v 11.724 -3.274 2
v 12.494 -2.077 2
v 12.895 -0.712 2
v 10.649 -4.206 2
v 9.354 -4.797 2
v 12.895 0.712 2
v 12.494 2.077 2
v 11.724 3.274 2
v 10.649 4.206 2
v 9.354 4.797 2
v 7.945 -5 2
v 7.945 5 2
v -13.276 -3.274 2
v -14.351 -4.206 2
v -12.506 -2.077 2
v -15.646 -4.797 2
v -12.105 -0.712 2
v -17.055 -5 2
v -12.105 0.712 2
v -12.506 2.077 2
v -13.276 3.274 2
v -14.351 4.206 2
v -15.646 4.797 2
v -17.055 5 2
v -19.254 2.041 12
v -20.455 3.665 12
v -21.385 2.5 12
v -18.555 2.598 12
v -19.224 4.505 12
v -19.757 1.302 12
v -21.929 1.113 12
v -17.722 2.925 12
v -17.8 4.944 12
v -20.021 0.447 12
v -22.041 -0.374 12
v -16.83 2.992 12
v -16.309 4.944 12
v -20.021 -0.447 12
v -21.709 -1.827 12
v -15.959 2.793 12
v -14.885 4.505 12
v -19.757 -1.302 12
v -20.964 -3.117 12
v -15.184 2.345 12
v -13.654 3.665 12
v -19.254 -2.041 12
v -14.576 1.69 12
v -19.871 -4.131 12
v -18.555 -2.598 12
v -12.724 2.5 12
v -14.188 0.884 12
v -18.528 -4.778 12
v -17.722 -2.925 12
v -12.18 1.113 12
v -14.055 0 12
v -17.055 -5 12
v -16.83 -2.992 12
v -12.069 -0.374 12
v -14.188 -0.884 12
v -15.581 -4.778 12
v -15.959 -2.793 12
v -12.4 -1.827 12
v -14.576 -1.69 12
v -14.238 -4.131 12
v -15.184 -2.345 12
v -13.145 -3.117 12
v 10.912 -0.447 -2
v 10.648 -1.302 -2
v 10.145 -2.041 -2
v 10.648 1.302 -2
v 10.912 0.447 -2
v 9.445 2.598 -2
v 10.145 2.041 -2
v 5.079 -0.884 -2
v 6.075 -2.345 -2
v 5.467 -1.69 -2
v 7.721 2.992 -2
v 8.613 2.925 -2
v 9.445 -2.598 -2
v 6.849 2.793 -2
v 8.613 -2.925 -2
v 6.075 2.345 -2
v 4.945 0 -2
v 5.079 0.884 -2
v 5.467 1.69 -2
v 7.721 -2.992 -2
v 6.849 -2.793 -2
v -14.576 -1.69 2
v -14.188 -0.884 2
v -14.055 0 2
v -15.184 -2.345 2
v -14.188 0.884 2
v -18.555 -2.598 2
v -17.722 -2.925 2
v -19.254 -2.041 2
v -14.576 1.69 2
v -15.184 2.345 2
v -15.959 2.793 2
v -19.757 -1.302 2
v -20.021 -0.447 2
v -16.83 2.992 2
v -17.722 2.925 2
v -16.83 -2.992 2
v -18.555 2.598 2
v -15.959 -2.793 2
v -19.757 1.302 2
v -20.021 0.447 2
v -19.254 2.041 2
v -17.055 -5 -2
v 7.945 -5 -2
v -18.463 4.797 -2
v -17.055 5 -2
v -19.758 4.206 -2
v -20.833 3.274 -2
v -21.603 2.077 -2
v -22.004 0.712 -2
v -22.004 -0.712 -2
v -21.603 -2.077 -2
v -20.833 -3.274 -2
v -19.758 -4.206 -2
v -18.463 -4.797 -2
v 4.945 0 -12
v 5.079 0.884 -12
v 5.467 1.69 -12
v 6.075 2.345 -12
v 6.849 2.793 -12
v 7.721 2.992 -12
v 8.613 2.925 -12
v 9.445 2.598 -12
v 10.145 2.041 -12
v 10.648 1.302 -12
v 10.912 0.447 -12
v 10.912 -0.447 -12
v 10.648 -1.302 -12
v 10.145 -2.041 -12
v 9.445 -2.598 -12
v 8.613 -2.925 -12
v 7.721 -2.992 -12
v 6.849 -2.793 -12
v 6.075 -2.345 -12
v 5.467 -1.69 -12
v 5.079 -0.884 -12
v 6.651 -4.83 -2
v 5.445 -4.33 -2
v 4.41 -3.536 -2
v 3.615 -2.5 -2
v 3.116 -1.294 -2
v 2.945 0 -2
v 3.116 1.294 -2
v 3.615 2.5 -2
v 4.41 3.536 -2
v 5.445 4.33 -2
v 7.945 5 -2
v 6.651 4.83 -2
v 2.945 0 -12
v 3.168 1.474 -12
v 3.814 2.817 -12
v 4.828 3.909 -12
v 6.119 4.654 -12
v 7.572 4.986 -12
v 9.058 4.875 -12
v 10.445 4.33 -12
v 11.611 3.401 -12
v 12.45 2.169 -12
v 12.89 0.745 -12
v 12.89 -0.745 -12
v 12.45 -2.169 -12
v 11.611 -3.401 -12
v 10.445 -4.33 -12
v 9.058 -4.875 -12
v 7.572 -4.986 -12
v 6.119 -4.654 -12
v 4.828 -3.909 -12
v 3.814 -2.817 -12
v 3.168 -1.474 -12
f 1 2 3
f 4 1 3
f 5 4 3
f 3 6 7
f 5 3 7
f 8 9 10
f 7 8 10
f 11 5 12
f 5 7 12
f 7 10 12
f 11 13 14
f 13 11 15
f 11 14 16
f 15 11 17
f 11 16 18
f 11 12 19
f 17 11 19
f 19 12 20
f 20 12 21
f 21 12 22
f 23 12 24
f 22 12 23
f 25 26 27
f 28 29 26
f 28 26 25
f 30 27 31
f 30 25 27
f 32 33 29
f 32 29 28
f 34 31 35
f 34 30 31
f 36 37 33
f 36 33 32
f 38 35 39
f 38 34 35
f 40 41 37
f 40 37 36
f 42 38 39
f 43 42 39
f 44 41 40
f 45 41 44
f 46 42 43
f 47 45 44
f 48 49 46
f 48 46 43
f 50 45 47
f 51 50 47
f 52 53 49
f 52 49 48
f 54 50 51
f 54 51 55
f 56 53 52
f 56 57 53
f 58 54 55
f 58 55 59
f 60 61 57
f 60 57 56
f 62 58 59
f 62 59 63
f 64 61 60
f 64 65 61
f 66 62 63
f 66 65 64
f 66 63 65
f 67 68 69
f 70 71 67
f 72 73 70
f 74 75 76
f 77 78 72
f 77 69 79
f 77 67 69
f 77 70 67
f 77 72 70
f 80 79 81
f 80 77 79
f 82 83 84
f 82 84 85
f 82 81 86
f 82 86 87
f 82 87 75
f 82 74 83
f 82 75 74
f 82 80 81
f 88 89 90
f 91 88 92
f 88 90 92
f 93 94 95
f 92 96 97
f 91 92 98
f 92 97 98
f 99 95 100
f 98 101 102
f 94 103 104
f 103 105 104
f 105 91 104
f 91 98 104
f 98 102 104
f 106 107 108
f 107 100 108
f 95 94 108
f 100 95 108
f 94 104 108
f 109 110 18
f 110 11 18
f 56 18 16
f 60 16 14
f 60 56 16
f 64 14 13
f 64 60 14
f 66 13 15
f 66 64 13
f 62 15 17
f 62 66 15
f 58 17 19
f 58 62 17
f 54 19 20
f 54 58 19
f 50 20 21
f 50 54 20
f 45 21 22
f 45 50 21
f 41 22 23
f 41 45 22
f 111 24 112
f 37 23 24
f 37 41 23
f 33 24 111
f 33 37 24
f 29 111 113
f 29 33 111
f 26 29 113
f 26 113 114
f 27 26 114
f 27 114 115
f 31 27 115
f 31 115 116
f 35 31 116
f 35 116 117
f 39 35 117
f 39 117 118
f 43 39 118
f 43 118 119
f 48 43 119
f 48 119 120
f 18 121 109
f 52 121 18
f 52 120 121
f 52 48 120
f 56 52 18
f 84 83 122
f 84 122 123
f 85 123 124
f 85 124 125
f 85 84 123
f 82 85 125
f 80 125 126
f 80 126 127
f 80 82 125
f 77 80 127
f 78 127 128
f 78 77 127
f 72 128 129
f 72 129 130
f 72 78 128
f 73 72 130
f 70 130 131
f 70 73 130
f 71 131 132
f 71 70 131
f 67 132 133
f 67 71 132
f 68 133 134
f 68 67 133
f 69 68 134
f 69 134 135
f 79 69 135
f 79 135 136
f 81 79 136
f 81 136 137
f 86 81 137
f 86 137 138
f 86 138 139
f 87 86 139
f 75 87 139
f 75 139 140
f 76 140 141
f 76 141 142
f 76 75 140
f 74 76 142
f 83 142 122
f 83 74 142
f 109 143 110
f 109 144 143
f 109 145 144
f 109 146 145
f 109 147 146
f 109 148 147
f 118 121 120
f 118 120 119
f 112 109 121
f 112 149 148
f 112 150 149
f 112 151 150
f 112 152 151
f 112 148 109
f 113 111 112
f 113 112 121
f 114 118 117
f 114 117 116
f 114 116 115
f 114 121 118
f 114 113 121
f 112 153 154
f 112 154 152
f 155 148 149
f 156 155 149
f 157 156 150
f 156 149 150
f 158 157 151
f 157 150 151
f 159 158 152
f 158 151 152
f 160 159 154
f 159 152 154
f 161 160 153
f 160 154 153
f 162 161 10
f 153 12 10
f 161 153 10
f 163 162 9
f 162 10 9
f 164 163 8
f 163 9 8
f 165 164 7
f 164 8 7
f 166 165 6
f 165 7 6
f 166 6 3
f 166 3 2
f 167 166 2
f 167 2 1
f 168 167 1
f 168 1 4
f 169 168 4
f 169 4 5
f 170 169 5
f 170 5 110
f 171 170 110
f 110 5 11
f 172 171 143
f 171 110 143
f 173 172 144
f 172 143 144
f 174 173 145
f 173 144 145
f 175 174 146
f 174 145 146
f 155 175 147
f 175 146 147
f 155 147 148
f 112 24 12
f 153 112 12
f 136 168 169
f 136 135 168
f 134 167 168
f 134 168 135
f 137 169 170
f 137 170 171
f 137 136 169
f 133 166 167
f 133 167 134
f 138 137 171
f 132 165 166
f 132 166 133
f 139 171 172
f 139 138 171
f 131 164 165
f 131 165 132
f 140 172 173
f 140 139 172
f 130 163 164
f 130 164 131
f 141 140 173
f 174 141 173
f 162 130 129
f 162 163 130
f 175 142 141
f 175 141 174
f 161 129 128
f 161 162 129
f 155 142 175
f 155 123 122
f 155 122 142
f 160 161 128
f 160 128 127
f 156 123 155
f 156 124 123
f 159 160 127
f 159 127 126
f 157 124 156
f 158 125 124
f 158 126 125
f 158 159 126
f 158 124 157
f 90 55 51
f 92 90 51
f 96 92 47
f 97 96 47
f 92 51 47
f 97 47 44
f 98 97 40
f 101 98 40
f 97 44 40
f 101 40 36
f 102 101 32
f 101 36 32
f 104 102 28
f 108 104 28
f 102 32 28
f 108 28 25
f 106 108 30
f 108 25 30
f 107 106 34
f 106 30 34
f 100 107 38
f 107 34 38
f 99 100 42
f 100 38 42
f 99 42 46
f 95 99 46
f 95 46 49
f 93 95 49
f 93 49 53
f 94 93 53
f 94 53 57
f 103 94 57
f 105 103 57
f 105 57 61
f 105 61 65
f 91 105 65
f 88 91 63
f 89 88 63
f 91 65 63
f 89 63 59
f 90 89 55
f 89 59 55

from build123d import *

# Parameters (mm, degrees)
BOSS_EXTRUDE1_DEPTH = 2
BOSS_EXTRUDE2_START = 10
SKETCH3_R           = 5
SKETCH3_R_2         = 3
BOSS_EXTRUDE2_DEPTH = 10
SKETCH4_R           = 5
SKETCH4_R_2         = 3
BOSS_EXTRUDE3_DEPTH = 10


with BuildPart() as part:
    # Sketch2 → Boss-Extrude1 (new, symmetric)
    with BuildSketch(Plane.XY):
        with BuildLine():
            Line((-17.054545455, 5), (7.945454545, 5))
            ThreePointArc((7.945454545, 5), (12.945454545, 0), (7.945454545, -5))
            Line((7.945454545, -5), (-17.054545455, -5))
            ThreePointArc((-17.054545455, -5), (-22.054545455, 0), (-17.054545455, 5))
        make_face()
    extrude(amount=BOSS_EXTRUDE1_DEPTH, both=True)

    # Sketch3 → Boss-Extrude2 (add)
    with BuildSketch(Plane.XY.offset(2).offset(BOSS_EXTRUDE2_START)):
        with Locations(Location((-17.054545455, 0, 0), (0, 0, 270))):
            Circle(SKETCH3_R)
        with Locations((-17.054545455, 0)):
            Circle(SKETCH3_R_2, mode=Mode.SUBTRACT)
    extrude(amount=-BOSS_EXTRUDE2_DEPTH)

    # Sketch4 → Boss-Extrude3 (add)
    with BuildSketch(Plane(origin=(0, 0, -2), x_dir=(-1, 0, 0), z_dir=(0, 0, -1))):
        with Locations((-7.945454545, 0)):
            Circle(SKETCH4_R)
        with Locations((-7.945454545, 0)):
            Circle(SKETCH4_R_2, mode=Mode.SUBTRACT)
    extrude(amount=BOSS_EXTRUDE3_DEPTH)


solid = part.part
